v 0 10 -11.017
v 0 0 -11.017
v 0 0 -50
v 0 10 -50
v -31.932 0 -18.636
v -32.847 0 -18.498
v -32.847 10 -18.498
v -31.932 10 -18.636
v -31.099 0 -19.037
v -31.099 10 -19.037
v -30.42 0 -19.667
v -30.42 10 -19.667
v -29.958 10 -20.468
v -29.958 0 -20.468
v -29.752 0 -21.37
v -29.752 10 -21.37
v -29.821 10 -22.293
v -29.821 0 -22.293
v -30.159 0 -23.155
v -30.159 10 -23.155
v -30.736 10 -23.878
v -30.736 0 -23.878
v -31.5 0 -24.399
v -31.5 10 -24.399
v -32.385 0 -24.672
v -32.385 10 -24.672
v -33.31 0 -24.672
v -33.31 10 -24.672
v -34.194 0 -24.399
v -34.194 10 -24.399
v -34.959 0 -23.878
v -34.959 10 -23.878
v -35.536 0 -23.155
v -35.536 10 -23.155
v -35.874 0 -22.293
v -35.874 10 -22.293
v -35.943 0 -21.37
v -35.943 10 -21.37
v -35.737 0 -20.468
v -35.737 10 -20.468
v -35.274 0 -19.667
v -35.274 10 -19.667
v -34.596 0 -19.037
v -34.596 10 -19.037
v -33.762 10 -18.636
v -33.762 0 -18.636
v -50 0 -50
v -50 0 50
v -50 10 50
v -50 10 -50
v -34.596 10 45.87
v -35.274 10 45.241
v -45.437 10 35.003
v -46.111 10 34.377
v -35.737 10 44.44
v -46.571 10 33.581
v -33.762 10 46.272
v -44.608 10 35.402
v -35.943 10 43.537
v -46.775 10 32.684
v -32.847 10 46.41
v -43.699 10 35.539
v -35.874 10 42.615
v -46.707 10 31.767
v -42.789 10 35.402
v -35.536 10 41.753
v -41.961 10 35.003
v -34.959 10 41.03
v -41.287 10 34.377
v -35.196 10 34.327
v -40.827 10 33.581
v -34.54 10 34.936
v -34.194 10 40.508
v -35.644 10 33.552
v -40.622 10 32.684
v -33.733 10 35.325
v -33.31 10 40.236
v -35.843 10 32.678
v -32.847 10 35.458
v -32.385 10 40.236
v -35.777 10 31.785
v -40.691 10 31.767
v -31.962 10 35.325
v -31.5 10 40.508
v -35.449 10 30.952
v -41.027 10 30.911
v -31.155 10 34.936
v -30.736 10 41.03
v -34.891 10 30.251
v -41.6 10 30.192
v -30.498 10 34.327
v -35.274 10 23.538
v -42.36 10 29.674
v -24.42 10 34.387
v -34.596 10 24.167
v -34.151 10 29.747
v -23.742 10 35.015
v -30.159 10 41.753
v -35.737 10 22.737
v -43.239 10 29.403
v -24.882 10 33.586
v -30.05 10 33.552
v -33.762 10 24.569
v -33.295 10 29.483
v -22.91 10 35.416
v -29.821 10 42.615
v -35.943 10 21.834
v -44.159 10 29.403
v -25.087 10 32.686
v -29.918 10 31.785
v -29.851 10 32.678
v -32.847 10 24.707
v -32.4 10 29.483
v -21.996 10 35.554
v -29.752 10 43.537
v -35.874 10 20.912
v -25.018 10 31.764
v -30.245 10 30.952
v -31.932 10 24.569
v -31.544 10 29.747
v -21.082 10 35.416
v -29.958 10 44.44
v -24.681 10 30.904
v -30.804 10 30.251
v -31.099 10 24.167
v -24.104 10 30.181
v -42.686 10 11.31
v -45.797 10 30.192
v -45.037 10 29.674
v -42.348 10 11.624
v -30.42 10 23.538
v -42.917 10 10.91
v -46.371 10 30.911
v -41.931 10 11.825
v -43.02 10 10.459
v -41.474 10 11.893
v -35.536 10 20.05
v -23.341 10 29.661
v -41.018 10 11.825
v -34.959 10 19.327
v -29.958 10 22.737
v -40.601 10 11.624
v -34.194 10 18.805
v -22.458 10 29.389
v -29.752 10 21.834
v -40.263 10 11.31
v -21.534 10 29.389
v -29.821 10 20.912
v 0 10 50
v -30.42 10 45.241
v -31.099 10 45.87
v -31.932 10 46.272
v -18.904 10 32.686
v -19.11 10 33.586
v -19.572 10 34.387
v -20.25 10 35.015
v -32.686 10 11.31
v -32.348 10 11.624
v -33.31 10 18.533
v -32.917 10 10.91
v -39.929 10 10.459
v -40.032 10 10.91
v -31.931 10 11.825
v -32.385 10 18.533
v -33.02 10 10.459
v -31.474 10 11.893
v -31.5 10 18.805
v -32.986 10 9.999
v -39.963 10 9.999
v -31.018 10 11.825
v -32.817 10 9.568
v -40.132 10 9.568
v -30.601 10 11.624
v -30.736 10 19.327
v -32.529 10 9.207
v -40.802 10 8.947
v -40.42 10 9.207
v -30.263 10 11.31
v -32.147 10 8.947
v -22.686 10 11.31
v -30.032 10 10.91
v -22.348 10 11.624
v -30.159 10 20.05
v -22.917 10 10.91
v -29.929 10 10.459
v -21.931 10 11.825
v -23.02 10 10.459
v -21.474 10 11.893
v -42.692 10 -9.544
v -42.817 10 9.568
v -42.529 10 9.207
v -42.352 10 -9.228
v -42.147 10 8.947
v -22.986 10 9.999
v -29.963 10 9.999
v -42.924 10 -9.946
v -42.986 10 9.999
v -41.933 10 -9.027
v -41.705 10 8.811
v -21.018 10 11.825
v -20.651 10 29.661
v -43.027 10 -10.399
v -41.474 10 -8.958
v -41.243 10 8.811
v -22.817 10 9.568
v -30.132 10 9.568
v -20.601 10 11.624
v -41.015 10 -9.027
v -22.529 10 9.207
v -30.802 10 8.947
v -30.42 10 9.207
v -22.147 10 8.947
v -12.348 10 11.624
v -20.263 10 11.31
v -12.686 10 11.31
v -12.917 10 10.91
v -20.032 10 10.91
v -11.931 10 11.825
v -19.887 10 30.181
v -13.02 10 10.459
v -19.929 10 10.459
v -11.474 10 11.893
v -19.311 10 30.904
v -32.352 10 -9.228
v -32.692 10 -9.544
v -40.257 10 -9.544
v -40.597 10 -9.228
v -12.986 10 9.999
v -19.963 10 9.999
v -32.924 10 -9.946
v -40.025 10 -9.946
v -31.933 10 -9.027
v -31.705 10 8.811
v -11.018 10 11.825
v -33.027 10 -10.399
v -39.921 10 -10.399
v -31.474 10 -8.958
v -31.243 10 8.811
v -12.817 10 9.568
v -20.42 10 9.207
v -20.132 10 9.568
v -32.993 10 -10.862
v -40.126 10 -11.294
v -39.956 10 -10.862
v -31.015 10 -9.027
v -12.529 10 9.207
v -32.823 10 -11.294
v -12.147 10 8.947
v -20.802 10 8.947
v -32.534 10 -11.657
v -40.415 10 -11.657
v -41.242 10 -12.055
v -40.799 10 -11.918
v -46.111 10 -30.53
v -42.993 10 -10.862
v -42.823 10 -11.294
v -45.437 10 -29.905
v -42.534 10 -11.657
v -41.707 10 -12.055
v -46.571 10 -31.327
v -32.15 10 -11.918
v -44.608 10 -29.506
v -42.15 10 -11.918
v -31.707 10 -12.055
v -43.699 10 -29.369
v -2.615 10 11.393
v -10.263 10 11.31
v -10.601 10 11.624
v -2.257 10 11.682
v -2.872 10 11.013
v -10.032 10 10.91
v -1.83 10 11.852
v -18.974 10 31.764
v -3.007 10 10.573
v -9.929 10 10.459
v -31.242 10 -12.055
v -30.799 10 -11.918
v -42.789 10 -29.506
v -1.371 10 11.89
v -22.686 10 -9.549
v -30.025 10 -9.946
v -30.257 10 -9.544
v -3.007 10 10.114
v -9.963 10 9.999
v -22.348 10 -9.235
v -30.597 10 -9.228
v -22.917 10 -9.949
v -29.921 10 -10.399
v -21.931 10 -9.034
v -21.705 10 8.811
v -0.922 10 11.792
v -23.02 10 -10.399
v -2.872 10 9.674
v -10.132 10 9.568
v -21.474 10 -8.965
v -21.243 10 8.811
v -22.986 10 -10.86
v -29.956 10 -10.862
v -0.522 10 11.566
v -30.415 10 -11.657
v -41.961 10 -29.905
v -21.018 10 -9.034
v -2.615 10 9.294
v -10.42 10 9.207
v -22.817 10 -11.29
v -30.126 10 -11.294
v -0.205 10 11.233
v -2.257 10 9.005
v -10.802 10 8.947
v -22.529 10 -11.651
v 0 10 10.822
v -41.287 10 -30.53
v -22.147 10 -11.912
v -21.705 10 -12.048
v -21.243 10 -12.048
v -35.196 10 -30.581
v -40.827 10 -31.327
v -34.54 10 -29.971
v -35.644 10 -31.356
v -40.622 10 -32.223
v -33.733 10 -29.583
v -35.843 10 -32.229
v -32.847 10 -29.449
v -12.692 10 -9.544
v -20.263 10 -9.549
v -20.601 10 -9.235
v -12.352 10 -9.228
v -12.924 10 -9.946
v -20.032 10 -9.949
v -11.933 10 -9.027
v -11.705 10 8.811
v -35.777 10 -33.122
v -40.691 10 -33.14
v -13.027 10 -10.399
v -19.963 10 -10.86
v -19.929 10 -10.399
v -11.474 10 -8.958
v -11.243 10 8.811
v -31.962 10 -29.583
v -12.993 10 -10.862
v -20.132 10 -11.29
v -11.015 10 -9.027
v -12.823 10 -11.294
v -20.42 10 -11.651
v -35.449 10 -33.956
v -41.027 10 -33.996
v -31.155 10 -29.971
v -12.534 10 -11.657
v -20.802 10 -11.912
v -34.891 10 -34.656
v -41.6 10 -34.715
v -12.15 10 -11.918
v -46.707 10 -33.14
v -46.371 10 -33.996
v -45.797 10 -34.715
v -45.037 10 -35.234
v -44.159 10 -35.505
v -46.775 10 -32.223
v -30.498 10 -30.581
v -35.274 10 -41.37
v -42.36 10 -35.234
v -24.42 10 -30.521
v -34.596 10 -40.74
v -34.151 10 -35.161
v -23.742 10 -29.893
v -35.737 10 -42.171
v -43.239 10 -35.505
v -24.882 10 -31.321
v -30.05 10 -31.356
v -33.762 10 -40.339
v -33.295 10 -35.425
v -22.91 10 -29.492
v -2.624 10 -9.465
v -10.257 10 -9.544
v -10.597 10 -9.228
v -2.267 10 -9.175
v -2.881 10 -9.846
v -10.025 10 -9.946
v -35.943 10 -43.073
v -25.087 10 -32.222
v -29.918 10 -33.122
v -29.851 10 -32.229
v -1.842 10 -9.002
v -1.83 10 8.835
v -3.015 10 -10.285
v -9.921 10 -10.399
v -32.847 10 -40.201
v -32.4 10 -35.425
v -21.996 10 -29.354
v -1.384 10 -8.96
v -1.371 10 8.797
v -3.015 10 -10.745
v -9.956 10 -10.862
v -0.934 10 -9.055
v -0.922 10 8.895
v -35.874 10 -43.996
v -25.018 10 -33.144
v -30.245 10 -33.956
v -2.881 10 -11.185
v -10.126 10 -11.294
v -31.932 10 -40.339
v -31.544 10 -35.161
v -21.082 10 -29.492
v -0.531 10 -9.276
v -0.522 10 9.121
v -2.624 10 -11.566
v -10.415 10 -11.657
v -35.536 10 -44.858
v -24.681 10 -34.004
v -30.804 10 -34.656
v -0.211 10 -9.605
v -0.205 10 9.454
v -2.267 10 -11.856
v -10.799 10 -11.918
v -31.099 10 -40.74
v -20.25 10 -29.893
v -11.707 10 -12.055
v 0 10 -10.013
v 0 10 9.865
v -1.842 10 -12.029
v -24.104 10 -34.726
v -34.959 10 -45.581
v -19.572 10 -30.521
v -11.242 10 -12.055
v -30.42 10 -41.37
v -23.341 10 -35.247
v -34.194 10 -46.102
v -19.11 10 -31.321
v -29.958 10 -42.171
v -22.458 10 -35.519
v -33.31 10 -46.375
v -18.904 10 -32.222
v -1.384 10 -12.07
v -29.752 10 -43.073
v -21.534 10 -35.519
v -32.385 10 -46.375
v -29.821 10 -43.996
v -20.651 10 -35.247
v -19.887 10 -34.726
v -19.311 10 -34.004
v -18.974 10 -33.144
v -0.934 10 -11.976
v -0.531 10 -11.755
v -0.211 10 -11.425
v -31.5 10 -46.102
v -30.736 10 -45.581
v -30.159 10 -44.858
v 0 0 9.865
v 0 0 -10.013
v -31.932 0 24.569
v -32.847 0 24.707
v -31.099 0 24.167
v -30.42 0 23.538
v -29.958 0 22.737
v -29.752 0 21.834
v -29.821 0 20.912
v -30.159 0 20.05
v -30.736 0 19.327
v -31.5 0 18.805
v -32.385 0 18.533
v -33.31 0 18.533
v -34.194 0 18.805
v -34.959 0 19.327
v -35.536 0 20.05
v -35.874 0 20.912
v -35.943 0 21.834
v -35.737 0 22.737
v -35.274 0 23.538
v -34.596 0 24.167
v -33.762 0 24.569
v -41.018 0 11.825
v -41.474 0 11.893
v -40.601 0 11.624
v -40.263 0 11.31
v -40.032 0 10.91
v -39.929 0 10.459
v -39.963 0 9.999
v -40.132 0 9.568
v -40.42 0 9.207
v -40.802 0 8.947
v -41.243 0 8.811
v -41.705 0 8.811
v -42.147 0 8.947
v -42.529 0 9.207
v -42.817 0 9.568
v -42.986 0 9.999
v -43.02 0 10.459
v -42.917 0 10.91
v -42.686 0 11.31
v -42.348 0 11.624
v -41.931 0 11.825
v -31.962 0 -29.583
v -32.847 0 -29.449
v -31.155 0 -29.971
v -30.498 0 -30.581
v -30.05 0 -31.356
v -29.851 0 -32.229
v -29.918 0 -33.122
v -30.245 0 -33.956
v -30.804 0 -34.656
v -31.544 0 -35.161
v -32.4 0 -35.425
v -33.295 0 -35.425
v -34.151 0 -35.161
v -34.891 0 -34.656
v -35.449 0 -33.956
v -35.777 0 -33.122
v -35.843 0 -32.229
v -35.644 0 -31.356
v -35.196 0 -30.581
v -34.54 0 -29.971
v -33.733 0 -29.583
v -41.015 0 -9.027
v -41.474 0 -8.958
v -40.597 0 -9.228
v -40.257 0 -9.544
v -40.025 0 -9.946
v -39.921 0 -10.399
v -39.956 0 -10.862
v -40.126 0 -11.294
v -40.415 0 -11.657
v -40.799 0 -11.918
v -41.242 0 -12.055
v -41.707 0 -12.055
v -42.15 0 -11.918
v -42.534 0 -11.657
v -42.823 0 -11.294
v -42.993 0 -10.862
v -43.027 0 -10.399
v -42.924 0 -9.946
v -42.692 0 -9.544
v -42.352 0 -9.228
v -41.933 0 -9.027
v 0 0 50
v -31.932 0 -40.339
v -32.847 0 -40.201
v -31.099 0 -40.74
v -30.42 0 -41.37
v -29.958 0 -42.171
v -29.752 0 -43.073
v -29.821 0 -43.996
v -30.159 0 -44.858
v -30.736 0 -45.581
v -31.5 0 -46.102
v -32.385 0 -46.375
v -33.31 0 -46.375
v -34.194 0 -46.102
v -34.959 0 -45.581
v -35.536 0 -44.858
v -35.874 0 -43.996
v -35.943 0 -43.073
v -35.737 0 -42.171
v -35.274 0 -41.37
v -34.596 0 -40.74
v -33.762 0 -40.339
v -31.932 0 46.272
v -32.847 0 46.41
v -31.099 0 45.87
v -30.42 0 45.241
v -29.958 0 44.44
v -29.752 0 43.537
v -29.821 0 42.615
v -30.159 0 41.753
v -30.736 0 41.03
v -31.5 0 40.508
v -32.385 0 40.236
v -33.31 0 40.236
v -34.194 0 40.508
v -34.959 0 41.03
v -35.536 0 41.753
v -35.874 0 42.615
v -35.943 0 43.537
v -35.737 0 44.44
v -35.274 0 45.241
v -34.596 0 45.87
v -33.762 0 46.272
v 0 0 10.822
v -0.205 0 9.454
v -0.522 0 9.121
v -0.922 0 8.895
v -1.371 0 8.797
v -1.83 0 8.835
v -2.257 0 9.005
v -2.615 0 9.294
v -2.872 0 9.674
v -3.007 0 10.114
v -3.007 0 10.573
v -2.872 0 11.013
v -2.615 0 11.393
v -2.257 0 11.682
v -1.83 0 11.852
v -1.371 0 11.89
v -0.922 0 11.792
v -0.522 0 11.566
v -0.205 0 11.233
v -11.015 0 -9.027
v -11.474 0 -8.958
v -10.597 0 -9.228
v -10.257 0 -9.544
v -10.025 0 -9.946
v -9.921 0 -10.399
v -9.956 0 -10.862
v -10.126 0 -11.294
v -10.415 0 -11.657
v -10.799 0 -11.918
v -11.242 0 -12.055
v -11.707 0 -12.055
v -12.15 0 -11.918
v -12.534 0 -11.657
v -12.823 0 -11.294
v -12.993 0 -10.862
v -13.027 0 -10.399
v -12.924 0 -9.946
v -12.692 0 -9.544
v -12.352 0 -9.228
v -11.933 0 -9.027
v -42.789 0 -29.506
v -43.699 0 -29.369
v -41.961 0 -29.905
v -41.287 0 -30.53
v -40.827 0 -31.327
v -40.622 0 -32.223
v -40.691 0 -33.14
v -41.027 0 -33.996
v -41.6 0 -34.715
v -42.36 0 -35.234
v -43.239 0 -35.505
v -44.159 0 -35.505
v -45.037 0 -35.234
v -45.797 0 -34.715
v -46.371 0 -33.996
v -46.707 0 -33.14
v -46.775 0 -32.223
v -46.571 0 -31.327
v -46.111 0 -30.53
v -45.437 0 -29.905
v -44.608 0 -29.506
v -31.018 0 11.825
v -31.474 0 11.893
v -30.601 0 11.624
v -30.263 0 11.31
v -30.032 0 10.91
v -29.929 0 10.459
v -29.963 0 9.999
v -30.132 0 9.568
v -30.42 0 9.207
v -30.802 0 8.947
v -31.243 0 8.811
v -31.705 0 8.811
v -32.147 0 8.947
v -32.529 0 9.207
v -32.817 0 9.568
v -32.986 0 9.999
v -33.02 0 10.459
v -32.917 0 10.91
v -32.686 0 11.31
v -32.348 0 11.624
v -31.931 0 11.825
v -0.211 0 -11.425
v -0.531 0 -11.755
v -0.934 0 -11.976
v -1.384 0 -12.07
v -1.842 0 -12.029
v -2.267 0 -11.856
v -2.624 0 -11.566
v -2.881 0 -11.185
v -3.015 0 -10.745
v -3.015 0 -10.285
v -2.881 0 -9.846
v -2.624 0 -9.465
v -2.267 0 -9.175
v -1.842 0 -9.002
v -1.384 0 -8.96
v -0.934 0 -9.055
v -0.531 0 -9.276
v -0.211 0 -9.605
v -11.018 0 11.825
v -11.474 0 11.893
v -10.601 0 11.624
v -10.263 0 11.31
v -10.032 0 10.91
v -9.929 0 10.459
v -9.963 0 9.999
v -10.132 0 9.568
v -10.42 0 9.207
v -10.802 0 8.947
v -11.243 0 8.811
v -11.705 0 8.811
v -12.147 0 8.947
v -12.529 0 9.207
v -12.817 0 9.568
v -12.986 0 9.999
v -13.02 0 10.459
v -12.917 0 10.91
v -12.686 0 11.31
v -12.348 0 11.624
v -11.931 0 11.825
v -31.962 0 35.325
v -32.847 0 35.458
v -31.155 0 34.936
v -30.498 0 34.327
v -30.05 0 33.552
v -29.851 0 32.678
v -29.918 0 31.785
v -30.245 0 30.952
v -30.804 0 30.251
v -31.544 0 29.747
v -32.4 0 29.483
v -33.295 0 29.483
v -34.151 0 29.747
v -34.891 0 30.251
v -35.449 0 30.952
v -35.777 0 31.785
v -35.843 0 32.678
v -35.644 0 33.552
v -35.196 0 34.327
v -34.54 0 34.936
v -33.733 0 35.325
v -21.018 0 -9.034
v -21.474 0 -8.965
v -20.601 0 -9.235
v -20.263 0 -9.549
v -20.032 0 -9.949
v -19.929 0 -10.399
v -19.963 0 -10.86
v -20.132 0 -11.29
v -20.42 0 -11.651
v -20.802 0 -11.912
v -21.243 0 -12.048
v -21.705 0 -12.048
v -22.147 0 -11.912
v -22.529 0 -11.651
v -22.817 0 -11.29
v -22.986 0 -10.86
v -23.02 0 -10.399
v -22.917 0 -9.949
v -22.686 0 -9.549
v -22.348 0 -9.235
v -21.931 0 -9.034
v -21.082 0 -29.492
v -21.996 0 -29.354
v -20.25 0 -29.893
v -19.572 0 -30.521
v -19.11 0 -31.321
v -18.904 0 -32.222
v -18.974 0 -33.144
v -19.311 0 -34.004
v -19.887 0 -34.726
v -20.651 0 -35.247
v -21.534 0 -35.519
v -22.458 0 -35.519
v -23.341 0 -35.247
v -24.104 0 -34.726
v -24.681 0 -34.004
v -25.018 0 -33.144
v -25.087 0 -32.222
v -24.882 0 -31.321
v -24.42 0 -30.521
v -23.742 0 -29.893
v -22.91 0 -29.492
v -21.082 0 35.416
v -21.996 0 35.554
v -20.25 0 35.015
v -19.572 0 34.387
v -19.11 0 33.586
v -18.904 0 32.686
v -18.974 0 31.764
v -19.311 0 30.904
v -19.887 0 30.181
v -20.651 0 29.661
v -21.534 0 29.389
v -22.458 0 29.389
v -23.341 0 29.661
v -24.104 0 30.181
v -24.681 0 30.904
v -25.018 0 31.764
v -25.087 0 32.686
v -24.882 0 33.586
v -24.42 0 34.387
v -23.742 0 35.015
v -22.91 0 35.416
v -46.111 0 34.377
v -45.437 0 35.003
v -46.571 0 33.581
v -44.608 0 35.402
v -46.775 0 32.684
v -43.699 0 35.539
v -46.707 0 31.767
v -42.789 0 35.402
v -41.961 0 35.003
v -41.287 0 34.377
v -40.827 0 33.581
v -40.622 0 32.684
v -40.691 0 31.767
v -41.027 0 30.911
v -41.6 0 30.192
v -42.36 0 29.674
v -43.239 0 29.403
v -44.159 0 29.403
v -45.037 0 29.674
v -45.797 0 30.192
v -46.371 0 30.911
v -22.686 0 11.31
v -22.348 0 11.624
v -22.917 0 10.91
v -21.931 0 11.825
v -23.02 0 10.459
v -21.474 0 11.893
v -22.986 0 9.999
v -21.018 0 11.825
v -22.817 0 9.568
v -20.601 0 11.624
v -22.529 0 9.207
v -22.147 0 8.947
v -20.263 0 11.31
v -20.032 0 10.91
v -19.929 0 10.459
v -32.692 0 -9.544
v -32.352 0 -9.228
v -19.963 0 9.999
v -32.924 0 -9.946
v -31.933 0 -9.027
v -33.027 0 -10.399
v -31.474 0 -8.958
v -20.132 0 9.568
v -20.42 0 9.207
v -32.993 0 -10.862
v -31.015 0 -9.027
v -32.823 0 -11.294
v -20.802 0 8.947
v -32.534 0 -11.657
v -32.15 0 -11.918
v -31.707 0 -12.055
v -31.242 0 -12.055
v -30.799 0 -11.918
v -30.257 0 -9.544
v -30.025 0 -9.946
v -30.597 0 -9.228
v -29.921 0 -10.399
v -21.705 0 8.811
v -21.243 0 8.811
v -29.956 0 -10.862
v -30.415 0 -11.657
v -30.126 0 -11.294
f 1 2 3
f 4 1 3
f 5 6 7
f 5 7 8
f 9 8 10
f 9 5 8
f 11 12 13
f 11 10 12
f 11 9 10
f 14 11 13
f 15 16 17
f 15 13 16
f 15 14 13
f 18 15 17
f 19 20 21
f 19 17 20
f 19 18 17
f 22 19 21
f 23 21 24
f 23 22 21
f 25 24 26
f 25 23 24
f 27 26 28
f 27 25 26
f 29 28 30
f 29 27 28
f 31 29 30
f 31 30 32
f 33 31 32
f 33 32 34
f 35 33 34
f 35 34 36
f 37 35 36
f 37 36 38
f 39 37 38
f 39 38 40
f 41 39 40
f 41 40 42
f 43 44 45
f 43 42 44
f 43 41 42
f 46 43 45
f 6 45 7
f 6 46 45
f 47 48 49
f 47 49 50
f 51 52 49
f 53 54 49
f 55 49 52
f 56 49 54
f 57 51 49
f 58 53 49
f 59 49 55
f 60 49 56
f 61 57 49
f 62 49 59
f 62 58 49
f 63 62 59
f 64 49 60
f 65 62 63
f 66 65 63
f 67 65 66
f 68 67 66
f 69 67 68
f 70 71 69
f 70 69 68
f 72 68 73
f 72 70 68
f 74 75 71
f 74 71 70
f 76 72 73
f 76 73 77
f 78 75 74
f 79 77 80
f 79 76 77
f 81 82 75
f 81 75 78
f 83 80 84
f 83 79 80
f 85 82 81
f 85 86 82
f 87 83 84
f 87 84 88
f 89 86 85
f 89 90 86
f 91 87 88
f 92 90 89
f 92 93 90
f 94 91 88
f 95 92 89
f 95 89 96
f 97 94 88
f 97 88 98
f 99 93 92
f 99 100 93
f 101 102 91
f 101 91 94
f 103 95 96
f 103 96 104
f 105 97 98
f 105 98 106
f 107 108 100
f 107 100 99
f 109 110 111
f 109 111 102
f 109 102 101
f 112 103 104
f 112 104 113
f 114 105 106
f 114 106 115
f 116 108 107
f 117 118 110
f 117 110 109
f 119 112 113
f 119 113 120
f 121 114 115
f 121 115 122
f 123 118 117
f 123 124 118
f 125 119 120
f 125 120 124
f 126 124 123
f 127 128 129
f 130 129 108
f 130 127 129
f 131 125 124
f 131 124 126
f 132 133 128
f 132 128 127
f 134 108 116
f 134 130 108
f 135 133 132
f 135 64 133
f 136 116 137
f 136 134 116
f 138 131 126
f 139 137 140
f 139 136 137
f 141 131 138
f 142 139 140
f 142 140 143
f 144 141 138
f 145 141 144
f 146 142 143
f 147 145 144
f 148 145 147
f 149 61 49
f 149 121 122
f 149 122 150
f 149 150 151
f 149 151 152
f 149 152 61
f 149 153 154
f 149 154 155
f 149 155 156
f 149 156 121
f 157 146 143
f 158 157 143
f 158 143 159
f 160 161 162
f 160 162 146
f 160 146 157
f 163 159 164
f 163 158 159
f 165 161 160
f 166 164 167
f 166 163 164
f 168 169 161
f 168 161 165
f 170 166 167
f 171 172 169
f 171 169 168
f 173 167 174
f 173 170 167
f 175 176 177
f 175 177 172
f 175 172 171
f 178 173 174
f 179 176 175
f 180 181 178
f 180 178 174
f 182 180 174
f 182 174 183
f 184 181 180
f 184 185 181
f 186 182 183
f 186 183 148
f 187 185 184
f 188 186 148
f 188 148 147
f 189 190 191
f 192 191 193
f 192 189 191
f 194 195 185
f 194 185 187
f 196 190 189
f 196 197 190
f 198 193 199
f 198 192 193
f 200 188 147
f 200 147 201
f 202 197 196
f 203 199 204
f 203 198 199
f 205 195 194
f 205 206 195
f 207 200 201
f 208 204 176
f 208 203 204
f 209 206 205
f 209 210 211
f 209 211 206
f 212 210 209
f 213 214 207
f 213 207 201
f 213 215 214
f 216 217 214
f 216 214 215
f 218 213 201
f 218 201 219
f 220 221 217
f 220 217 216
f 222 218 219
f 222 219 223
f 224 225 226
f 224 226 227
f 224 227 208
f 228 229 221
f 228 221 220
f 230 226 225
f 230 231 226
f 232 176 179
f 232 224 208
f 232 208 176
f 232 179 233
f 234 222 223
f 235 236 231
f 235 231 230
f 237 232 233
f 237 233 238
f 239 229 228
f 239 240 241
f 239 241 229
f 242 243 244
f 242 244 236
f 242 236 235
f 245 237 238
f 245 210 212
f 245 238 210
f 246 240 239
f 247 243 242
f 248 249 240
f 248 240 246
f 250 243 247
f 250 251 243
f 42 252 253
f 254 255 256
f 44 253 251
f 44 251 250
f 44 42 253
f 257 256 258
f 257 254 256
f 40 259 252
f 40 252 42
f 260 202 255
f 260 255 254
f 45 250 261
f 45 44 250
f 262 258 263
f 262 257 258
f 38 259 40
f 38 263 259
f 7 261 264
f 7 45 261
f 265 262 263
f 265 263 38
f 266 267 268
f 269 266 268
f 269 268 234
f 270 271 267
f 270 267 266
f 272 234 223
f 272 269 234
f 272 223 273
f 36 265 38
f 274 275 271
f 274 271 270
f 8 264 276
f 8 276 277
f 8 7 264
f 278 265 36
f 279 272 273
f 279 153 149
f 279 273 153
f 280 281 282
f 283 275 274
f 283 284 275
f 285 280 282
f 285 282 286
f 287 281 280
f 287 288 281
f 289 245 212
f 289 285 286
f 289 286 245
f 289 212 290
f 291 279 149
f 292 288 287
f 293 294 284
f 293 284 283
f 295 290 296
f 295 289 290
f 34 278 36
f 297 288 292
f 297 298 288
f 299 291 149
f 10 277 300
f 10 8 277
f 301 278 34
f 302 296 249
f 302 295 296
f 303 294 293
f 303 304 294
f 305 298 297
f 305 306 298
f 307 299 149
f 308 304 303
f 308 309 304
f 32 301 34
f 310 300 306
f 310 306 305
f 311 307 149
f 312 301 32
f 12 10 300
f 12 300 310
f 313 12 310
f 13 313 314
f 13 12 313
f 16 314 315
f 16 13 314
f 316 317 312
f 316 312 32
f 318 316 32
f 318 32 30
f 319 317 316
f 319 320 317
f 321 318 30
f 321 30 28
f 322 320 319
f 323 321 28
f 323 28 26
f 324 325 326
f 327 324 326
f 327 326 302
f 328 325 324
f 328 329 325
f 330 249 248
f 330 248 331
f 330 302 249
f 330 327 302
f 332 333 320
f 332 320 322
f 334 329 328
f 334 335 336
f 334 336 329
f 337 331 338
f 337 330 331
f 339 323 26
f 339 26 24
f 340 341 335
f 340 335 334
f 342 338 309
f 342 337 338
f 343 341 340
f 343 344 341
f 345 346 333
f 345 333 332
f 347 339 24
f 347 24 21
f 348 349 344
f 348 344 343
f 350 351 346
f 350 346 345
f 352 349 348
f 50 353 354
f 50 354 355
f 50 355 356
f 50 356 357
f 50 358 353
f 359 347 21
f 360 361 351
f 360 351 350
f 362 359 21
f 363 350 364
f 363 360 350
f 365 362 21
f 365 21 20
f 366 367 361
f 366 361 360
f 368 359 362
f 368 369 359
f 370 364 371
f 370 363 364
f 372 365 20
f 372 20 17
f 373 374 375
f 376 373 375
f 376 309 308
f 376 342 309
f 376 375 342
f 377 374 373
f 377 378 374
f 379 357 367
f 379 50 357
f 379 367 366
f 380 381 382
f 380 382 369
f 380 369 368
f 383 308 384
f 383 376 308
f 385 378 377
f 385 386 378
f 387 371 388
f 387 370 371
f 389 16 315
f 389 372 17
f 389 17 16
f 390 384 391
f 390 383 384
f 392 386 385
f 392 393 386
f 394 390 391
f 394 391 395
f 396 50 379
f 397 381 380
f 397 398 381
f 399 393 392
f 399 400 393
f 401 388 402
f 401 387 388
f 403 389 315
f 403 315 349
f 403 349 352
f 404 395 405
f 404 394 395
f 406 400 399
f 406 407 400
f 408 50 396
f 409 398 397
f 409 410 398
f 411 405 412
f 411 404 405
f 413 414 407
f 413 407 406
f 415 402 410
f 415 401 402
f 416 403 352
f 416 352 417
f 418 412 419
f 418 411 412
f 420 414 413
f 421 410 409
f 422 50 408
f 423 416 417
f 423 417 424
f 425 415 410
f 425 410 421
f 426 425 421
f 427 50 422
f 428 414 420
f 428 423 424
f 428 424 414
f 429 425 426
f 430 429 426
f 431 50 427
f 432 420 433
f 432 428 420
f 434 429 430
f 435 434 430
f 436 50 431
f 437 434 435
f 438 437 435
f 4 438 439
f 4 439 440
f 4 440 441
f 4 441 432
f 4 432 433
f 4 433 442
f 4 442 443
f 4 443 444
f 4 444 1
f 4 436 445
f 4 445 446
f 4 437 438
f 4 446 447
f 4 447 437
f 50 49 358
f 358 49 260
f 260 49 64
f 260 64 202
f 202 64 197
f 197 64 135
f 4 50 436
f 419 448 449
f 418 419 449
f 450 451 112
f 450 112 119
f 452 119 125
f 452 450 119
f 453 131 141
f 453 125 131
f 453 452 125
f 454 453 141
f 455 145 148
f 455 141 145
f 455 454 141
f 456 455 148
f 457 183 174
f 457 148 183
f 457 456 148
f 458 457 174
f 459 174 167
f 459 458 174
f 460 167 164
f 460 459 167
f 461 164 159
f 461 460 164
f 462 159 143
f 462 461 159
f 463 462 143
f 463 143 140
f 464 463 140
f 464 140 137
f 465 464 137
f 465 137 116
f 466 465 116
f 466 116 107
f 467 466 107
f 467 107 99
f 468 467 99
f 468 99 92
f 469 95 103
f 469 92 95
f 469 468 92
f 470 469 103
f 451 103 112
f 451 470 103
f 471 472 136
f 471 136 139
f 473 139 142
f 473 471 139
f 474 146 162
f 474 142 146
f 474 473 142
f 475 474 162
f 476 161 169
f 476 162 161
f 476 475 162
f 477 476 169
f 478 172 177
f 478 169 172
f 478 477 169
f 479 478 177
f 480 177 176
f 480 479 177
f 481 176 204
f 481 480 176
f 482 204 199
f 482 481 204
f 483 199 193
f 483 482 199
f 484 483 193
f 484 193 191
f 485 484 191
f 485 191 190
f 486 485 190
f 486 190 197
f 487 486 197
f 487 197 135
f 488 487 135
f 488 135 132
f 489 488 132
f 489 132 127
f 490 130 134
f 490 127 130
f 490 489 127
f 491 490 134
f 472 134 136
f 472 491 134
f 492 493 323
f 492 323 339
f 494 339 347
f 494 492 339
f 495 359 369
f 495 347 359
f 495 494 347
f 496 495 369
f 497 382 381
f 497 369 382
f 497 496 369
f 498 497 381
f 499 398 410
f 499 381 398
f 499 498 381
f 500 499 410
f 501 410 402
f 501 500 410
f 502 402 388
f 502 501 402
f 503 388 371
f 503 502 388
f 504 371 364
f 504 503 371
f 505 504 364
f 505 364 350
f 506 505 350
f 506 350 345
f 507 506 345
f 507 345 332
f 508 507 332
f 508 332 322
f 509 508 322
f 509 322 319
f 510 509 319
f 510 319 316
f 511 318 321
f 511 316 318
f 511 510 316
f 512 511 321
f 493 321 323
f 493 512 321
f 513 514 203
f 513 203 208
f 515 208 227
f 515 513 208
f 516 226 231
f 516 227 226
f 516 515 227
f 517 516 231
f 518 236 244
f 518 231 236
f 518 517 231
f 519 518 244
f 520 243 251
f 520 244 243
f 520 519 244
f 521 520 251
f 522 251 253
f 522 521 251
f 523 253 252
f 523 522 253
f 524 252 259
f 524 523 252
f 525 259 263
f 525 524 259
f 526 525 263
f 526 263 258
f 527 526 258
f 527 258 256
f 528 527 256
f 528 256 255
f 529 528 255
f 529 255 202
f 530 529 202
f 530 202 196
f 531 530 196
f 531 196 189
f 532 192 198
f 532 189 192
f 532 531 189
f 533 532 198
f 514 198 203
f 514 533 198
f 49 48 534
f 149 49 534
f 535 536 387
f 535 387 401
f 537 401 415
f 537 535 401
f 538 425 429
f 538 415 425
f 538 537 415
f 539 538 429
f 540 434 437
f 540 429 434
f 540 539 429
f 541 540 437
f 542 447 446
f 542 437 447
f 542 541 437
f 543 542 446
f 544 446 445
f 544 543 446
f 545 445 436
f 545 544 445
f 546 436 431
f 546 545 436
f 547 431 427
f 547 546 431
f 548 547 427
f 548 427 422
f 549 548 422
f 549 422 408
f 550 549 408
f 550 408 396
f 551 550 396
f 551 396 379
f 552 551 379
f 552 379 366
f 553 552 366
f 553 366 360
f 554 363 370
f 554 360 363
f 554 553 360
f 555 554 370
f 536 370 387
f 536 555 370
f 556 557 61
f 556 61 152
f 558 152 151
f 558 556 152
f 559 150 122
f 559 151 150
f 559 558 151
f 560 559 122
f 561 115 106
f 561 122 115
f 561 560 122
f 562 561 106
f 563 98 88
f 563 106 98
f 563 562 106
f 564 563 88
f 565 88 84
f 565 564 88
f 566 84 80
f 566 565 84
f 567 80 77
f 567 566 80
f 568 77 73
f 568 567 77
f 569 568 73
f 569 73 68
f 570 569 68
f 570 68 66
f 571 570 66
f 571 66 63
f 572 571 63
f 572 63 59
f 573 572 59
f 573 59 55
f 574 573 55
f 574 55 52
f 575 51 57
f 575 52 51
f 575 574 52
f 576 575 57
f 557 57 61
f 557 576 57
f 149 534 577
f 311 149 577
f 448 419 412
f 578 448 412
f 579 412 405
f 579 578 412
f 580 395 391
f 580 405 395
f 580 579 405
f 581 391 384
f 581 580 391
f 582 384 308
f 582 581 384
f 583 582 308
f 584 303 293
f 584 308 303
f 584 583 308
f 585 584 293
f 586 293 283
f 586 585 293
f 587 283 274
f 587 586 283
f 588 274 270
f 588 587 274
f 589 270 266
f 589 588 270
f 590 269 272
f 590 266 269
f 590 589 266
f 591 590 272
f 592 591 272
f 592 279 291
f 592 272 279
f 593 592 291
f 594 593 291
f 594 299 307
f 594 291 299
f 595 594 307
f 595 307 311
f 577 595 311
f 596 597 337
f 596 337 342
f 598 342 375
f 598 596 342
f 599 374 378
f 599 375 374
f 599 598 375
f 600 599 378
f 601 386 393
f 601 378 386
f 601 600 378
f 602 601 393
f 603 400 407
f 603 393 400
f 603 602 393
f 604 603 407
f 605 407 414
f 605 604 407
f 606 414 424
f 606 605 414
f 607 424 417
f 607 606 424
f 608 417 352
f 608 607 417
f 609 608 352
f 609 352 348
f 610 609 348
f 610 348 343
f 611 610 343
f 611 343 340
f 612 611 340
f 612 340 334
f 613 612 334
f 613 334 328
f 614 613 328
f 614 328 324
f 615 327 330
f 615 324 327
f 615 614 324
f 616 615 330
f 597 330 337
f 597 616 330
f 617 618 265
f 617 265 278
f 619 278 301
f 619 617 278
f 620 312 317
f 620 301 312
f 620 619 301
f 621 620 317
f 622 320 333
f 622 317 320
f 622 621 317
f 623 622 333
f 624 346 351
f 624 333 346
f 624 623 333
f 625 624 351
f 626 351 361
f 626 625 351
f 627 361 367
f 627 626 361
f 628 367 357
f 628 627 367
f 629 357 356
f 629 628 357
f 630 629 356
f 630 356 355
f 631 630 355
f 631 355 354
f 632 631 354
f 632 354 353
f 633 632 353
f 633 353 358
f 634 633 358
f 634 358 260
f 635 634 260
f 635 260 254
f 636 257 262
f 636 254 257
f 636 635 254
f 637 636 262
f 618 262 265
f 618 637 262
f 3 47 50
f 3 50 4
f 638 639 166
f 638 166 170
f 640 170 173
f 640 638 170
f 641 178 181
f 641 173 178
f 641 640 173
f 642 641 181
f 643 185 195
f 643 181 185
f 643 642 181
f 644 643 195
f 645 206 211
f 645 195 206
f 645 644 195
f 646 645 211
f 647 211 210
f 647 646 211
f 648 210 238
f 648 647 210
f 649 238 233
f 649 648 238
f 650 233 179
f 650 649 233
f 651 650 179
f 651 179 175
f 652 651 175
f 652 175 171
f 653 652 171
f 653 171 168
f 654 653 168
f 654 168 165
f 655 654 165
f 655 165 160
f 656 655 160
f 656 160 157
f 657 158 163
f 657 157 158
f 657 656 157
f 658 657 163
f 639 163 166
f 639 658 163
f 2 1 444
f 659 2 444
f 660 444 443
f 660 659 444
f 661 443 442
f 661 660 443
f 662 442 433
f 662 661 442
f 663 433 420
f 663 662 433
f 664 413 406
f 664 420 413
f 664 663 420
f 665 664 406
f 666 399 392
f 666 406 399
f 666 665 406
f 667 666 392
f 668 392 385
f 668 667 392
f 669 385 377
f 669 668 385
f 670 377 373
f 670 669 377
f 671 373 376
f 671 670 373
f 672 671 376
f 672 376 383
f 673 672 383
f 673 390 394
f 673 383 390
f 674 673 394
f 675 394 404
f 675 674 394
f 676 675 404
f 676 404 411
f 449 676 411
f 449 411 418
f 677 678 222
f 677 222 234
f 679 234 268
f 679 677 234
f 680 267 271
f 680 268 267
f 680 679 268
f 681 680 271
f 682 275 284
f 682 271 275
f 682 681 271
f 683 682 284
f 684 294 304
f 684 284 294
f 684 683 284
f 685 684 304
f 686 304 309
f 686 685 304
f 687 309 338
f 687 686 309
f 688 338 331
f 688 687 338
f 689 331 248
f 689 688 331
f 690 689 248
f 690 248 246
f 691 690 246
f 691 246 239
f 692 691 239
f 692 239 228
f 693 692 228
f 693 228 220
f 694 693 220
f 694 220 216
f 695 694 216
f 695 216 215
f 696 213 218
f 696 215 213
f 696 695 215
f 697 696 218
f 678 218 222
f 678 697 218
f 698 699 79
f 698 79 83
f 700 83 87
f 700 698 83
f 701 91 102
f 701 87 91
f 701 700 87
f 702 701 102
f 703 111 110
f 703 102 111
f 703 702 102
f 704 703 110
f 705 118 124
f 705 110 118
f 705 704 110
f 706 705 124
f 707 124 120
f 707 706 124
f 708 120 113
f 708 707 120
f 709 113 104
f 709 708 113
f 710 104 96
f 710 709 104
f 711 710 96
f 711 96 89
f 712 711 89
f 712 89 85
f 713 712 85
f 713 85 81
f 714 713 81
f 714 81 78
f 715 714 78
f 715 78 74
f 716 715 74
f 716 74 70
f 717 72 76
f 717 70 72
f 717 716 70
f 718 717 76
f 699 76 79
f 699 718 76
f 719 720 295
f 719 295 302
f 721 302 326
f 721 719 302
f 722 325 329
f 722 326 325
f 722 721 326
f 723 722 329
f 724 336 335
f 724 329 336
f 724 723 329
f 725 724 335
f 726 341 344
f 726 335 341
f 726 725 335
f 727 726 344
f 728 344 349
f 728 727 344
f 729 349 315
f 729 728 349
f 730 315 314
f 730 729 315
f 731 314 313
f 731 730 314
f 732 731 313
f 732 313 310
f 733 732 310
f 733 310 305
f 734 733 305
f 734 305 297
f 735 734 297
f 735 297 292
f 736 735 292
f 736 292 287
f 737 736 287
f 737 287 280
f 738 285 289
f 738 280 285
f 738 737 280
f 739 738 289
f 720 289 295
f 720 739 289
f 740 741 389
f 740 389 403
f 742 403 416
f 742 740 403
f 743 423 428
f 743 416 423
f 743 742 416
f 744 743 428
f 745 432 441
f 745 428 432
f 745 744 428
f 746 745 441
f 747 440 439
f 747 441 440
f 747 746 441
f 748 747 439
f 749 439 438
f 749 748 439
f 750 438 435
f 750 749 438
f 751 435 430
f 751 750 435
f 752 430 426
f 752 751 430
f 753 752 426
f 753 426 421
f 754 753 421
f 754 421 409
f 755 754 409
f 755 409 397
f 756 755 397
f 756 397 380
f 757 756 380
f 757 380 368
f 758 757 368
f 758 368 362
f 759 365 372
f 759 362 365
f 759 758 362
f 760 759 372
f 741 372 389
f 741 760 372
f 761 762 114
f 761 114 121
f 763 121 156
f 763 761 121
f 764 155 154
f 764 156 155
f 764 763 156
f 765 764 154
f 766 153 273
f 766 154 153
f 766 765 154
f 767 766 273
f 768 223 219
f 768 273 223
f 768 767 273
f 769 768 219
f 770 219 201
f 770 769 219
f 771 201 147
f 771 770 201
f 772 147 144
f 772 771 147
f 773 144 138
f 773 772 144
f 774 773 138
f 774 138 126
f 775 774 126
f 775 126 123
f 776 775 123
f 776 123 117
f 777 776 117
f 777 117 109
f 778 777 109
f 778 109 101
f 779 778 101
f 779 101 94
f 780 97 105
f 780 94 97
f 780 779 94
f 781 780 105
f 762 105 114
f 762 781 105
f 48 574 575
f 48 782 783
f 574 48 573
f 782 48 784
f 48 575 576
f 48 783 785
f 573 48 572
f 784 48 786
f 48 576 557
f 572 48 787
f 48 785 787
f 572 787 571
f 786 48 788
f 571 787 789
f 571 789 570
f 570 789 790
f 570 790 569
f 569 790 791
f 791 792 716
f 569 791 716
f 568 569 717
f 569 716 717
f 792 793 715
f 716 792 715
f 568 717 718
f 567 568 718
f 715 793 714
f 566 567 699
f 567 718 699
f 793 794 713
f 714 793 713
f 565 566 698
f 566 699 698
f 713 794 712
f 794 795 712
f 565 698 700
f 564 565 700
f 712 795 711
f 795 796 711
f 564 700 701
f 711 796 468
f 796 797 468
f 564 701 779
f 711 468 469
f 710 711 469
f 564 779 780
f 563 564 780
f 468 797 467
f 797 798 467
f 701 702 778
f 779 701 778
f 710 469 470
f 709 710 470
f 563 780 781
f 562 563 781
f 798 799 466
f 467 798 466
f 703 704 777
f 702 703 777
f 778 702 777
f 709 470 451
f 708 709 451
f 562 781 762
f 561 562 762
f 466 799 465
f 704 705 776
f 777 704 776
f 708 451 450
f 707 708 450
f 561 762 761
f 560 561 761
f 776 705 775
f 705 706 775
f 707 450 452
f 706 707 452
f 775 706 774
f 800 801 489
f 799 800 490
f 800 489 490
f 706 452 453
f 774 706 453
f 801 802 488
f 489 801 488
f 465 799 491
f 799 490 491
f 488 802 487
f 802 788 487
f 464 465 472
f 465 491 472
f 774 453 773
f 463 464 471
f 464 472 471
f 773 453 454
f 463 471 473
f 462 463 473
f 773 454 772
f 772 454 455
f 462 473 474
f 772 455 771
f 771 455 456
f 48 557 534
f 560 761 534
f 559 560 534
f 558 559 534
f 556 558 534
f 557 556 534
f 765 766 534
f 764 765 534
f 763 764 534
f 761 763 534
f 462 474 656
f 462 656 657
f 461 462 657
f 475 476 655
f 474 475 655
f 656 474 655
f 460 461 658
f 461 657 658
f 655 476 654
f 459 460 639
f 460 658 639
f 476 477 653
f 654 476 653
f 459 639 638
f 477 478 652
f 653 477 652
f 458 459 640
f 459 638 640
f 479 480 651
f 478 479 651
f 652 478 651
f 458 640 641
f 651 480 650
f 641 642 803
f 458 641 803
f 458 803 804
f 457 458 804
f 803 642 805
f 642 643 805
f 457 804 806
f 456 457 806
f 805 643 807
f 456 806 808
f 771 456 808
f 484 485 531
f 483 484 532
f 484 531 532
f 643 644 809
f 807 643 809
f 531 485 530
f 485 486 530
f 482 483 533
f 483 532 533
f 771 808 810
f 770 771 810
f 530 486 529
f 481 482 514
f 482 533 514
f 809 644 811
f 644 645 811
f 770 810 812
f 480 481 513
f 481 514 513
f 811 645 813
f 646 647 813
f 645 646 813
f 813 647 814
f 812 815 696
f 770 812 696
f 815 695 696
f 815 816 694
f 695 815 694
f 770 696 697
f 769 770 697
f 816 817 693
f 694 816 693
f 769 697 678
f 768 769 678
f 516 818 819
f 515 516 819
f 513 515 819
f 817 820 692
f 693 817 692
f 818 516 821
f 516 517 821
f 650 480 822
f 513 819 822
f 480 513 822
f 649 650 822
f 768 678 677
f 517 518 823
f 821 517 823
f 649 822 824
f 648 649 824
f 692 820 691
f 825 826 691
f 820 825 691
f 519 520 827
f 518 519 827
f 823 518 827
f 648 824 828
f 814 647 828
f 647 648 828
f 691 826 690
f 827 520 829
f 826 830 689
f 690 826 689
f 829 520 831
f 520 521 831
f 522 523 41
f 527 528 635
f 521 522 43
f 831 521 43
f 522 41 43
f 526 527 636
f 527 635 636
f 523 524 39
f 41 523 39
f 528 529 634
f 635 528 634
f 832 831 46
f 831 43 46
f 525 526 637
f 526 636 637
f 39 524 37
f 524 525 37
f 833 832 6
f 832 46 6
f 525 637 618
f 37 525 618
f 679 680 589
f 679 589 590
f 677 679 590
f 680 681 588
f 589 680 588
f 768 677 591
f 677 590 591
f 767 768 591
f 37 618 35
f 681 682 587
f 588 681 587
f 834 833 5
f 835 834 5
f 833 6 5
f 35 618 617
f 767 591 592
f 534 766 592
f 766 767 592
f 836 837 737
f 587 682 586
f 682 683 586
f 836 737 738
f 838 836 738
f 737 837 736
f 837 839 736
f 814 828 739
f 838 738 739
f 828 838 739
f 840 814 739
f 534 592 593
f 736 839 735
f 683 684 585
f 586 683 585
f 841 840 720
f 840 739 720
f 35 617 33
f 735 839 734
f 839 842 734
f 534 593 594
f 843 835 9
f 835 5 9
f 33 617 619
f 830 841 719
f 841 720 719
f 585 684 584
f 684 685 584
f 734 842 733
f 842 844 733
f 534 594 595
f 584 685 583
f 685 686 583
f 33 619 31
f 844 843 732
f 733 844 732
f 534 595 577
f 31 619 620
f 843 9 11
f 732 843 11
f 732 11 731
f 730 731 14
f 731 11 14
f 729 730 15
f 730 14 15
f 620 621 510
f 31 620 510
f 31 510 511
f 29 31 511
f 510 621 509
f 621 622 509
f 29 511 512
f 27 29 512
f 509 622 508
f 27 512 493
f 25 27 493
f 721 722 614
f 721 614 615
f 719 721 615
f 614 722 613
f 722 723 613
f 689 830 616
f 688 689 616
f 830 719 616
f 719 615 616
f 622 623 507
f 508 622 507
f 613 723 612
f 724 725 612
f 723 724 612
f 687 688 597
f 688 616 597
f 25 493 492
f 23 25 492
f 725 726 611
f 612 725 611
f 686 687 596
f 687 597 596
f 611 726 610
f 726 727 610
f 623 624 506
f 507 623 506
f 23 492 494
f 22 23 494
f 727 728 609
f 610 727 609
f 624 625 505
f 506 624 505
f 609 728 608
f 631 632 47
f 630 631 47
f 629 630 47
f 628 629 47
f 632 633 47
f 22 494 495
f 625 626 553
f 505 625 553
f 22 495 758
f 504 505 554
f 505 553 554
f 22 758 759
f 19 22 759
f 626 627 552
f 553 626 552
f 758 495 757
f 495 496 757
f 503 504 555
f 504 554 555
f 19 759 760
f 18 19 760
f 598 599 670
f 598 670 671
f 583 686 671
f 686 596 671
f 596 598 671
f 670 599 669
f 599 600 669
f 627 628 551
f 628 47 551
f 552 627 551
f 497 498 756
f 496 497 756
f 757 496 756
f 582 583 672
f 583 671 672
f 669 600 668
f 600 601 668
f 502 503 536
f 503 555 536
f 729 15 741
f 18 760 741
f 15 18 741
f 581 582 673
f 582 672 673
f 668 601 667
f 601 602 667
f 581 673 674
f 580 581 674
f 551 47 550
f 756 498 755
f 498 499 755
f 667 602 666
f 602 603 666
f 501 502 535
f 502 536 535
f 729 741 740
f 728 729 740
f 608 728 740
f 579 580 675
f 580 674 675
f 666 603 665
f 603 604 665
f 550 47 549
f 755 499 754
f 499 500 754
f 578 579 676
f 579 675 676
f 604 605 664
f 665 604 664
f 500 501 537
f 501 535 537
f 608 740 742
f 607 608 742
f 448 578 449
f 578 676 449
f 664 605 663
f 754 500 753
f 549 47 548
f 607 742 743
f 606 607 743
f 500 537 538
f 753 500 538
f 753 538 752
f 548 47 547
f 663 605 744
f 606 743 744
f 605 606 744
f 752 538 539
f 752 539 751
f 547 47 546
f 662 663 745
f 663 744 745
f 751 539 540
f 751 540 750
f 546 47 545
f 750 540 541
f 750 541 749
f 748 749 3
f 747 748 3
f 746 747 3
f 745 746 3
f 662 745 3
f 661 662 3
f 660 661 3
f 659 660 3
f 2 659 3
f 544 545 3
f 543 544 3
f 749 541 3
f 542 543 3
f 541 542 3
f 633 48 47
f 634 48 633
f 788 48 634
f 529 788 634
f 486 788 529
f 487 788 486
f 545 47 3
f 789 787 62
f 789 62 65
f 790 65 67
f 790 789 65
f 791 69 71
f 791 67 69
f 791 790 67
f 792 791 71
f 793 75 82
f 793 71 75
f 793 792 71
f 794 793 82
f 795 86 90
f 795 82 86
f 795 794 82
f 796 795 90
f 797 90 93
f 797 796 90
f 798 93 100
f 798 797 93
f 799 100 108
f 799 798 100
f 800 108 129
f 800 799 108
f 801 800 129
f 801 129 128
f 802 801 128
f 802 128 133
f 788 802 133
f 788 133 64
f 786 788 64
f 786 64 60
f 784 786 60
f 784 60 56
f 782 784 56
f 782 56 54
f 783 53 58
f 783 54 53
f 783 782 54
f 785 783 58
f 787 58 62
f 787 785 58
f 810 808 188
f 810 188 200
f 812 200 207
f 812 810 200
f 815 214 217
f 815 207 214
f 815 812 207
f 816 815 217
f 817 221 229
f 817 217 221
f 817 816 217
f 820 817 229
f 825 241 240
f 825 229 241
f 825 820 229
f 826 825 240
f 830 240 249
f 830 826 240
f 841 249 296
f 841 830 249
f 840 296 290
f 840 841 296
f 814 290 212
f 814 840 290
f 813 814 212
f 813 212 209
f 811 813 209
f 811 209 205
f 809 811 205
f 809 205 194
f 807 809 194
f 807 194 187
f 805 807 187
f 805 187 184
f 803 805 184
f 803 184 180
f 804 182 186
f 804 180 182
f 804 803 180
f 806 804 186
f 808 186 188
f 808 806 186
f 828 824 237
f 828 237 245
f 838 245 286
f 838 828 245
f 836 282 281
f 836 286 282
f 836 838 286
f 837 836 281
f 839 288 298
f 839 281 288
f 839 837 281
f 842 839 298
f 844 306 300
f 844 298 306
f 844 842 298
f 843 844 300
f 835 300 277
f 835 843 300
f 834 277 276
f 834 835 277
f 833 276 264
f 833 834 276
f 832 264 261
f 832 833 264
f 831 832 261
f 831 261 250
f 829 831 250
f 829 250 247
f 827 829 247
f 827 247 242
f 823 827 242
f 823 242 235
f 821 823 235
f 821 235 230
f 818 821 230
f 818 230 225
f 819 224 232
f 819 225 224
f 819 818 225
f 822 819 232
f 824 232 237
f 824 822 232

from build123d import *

# Parameters (mm, degrees)
SKETCH1_W               = 50
SKETCH1_H               = 100
BOSS_EXTRUDE1_DEPTH     = 10
CUT_EXTRUDE1_DEPTH      = 72.414284285
CUT_EXTRUDE1_DEPTH_BACK = 72.414284285
SKETCH2_R               = 3.104362215
SKETCH2_R_2             = 3.085158395
SKETCH2_R_3             = 3.1
SKETCH2_R_4             = 3.004524649
CUT_EXTRUDE2_DEPTH      = 72.414284285
CUT_EXTRUDE2_DEPTH_BACK = 72.414284285
SKETCH4_R               = 1.557412487
SKETCH4_R_2             = 1.55


with BuildPart() as part:
    # Sketch1 → Boss-Extrude1 (new body)
    with BuildSketch(Plane(origin=(0, 0, 0), x_dir=(1, 0, 0), z_dir=(0, 1, 0))):
        with Locations((-25, 0)):
            Rectangle(SKETCH1_W, SKETCH1_H)
    extrude(amount=BOSS_EXTRUDE1_DEPTH)

    # Sketch2 → Cut-Extrude1 (cut, two sides: drawn at the far end of the back side and taken through both)
    with BuildSketch(Plane(origin=(0, 10, 0), x_dir=(1, 0, 0), z_dir=(0, 1, 0)).offset(-CUT_EXTRUDE1_DEPTH_BACK)):
        with Locations(Location((-32.847308623, -43.305370298, 0), (0, 0, 270))):
            Circle(SKETCH2_R)
        with Locations(Location((-43.698787397, -32.453891525, 0), (0, 0, 270))):
            Circle(SKETCH2_R_2)
        with Locations(Location((-21.99582985, -32.453891525, 0), (0, 0, 270))):
            Circle(SKETCH2_R_3)
        with Locations(Location((-32.847308623, -21.602412752, 0), (0, 0, 270))):
            Circle(SKETCH2_R)
        with Locations(Location((-32.847308623, -32.453891525, 0), (0, 0, 270))):
            Circle(SKETCH2_R_4)
        with Locations(Location((-32.847308623, 32.453891525, 0), (0, 0, 270))):
            Circle(SKETCH2_R_4)
        with Locations(Location((-32.847308623, 21.602412752, 0), (0, 0, 270))):
            Circle(SKETCH2_R)
        with Locations(Location((-21.99582985, 32.453891525, 0), (0, 0, 270))):
            Circle(SKETCH2_R_3)
        with Locations(Location((-43.698787397, 32.453891525, 0), (0, 0, 270))):
            Circle(SKETCH2_R_2)
        with Locations(Location((-32.847308623, 43.305370298, 0), (0, 0, 270))):
            Circle(SKETCH2_R)
    extrude(amount=CUT_EXTRUDE1_DEPTH + CUT_EXTRUDE1_DEPTH_BACK, mode=Mode.SUBTRACT)

    # Sketch4 → Cut-Extrude2 (cut, two sides: drawn at the far end of the back side and taken through both)
    with BuildSketch(Plane(origin=(0, 10, 0), x_dir=(1, 0, 0), z_dir=(0, 1, 0)).offset(-CUT_EXTRUDE2_DEPTH_BACK)):
        with Locations(Location((-41.474384237, 10.515205344, 0), (0, 0, 270))):
            Circle(SKETCH4_R)
        with Locations(Location((-41.474384237, -10.343457517, 0), (0, 0, 270))):
            Circle(SKETCH4_R_2)
        with Locations(Location((-31.474384237, -10.343457517, 0), (0, 0, 270))):
            Circle(SKETCH4_R_2)
        with Locations(Location((-31.474384237, 10.515205344, 0), (0, 0, 270))):
            Circle(SKETCH4_R)
        with Locations(Location((-21.474384237, 10.515205344, 0), (0, 0, 270))):
            Circle(SKETCH4_R_2)
        with Locations(Location((-21.474384237, -10.343457517, 0), (0, 0, 270))):
            Circle(SKETCH4_R_2)
        with Locations(Location((-11.474384237, -10.343457517, 0), (0, 0, 270))):
            Circle(SKETCH4_R_2)
        with Locations((-1.474384237, -10.343457517)):
            Circle(SKETCH4_R_2)
        with Locations(Location((-11.474384237, 10.515205344, 0), (0, 0, 270))):
            Circle(SKETCH4_R)
        with Locations((-1.474384237, 10.515205344)):
            Circle(SKETCH4_R)
    extrude(amount=CUT_EXTRUDE2_DEPTH + CUT_EXTRUDE2_DEPTH_BACK, mode=Mode.SUBTRACT)


solid = part.part
